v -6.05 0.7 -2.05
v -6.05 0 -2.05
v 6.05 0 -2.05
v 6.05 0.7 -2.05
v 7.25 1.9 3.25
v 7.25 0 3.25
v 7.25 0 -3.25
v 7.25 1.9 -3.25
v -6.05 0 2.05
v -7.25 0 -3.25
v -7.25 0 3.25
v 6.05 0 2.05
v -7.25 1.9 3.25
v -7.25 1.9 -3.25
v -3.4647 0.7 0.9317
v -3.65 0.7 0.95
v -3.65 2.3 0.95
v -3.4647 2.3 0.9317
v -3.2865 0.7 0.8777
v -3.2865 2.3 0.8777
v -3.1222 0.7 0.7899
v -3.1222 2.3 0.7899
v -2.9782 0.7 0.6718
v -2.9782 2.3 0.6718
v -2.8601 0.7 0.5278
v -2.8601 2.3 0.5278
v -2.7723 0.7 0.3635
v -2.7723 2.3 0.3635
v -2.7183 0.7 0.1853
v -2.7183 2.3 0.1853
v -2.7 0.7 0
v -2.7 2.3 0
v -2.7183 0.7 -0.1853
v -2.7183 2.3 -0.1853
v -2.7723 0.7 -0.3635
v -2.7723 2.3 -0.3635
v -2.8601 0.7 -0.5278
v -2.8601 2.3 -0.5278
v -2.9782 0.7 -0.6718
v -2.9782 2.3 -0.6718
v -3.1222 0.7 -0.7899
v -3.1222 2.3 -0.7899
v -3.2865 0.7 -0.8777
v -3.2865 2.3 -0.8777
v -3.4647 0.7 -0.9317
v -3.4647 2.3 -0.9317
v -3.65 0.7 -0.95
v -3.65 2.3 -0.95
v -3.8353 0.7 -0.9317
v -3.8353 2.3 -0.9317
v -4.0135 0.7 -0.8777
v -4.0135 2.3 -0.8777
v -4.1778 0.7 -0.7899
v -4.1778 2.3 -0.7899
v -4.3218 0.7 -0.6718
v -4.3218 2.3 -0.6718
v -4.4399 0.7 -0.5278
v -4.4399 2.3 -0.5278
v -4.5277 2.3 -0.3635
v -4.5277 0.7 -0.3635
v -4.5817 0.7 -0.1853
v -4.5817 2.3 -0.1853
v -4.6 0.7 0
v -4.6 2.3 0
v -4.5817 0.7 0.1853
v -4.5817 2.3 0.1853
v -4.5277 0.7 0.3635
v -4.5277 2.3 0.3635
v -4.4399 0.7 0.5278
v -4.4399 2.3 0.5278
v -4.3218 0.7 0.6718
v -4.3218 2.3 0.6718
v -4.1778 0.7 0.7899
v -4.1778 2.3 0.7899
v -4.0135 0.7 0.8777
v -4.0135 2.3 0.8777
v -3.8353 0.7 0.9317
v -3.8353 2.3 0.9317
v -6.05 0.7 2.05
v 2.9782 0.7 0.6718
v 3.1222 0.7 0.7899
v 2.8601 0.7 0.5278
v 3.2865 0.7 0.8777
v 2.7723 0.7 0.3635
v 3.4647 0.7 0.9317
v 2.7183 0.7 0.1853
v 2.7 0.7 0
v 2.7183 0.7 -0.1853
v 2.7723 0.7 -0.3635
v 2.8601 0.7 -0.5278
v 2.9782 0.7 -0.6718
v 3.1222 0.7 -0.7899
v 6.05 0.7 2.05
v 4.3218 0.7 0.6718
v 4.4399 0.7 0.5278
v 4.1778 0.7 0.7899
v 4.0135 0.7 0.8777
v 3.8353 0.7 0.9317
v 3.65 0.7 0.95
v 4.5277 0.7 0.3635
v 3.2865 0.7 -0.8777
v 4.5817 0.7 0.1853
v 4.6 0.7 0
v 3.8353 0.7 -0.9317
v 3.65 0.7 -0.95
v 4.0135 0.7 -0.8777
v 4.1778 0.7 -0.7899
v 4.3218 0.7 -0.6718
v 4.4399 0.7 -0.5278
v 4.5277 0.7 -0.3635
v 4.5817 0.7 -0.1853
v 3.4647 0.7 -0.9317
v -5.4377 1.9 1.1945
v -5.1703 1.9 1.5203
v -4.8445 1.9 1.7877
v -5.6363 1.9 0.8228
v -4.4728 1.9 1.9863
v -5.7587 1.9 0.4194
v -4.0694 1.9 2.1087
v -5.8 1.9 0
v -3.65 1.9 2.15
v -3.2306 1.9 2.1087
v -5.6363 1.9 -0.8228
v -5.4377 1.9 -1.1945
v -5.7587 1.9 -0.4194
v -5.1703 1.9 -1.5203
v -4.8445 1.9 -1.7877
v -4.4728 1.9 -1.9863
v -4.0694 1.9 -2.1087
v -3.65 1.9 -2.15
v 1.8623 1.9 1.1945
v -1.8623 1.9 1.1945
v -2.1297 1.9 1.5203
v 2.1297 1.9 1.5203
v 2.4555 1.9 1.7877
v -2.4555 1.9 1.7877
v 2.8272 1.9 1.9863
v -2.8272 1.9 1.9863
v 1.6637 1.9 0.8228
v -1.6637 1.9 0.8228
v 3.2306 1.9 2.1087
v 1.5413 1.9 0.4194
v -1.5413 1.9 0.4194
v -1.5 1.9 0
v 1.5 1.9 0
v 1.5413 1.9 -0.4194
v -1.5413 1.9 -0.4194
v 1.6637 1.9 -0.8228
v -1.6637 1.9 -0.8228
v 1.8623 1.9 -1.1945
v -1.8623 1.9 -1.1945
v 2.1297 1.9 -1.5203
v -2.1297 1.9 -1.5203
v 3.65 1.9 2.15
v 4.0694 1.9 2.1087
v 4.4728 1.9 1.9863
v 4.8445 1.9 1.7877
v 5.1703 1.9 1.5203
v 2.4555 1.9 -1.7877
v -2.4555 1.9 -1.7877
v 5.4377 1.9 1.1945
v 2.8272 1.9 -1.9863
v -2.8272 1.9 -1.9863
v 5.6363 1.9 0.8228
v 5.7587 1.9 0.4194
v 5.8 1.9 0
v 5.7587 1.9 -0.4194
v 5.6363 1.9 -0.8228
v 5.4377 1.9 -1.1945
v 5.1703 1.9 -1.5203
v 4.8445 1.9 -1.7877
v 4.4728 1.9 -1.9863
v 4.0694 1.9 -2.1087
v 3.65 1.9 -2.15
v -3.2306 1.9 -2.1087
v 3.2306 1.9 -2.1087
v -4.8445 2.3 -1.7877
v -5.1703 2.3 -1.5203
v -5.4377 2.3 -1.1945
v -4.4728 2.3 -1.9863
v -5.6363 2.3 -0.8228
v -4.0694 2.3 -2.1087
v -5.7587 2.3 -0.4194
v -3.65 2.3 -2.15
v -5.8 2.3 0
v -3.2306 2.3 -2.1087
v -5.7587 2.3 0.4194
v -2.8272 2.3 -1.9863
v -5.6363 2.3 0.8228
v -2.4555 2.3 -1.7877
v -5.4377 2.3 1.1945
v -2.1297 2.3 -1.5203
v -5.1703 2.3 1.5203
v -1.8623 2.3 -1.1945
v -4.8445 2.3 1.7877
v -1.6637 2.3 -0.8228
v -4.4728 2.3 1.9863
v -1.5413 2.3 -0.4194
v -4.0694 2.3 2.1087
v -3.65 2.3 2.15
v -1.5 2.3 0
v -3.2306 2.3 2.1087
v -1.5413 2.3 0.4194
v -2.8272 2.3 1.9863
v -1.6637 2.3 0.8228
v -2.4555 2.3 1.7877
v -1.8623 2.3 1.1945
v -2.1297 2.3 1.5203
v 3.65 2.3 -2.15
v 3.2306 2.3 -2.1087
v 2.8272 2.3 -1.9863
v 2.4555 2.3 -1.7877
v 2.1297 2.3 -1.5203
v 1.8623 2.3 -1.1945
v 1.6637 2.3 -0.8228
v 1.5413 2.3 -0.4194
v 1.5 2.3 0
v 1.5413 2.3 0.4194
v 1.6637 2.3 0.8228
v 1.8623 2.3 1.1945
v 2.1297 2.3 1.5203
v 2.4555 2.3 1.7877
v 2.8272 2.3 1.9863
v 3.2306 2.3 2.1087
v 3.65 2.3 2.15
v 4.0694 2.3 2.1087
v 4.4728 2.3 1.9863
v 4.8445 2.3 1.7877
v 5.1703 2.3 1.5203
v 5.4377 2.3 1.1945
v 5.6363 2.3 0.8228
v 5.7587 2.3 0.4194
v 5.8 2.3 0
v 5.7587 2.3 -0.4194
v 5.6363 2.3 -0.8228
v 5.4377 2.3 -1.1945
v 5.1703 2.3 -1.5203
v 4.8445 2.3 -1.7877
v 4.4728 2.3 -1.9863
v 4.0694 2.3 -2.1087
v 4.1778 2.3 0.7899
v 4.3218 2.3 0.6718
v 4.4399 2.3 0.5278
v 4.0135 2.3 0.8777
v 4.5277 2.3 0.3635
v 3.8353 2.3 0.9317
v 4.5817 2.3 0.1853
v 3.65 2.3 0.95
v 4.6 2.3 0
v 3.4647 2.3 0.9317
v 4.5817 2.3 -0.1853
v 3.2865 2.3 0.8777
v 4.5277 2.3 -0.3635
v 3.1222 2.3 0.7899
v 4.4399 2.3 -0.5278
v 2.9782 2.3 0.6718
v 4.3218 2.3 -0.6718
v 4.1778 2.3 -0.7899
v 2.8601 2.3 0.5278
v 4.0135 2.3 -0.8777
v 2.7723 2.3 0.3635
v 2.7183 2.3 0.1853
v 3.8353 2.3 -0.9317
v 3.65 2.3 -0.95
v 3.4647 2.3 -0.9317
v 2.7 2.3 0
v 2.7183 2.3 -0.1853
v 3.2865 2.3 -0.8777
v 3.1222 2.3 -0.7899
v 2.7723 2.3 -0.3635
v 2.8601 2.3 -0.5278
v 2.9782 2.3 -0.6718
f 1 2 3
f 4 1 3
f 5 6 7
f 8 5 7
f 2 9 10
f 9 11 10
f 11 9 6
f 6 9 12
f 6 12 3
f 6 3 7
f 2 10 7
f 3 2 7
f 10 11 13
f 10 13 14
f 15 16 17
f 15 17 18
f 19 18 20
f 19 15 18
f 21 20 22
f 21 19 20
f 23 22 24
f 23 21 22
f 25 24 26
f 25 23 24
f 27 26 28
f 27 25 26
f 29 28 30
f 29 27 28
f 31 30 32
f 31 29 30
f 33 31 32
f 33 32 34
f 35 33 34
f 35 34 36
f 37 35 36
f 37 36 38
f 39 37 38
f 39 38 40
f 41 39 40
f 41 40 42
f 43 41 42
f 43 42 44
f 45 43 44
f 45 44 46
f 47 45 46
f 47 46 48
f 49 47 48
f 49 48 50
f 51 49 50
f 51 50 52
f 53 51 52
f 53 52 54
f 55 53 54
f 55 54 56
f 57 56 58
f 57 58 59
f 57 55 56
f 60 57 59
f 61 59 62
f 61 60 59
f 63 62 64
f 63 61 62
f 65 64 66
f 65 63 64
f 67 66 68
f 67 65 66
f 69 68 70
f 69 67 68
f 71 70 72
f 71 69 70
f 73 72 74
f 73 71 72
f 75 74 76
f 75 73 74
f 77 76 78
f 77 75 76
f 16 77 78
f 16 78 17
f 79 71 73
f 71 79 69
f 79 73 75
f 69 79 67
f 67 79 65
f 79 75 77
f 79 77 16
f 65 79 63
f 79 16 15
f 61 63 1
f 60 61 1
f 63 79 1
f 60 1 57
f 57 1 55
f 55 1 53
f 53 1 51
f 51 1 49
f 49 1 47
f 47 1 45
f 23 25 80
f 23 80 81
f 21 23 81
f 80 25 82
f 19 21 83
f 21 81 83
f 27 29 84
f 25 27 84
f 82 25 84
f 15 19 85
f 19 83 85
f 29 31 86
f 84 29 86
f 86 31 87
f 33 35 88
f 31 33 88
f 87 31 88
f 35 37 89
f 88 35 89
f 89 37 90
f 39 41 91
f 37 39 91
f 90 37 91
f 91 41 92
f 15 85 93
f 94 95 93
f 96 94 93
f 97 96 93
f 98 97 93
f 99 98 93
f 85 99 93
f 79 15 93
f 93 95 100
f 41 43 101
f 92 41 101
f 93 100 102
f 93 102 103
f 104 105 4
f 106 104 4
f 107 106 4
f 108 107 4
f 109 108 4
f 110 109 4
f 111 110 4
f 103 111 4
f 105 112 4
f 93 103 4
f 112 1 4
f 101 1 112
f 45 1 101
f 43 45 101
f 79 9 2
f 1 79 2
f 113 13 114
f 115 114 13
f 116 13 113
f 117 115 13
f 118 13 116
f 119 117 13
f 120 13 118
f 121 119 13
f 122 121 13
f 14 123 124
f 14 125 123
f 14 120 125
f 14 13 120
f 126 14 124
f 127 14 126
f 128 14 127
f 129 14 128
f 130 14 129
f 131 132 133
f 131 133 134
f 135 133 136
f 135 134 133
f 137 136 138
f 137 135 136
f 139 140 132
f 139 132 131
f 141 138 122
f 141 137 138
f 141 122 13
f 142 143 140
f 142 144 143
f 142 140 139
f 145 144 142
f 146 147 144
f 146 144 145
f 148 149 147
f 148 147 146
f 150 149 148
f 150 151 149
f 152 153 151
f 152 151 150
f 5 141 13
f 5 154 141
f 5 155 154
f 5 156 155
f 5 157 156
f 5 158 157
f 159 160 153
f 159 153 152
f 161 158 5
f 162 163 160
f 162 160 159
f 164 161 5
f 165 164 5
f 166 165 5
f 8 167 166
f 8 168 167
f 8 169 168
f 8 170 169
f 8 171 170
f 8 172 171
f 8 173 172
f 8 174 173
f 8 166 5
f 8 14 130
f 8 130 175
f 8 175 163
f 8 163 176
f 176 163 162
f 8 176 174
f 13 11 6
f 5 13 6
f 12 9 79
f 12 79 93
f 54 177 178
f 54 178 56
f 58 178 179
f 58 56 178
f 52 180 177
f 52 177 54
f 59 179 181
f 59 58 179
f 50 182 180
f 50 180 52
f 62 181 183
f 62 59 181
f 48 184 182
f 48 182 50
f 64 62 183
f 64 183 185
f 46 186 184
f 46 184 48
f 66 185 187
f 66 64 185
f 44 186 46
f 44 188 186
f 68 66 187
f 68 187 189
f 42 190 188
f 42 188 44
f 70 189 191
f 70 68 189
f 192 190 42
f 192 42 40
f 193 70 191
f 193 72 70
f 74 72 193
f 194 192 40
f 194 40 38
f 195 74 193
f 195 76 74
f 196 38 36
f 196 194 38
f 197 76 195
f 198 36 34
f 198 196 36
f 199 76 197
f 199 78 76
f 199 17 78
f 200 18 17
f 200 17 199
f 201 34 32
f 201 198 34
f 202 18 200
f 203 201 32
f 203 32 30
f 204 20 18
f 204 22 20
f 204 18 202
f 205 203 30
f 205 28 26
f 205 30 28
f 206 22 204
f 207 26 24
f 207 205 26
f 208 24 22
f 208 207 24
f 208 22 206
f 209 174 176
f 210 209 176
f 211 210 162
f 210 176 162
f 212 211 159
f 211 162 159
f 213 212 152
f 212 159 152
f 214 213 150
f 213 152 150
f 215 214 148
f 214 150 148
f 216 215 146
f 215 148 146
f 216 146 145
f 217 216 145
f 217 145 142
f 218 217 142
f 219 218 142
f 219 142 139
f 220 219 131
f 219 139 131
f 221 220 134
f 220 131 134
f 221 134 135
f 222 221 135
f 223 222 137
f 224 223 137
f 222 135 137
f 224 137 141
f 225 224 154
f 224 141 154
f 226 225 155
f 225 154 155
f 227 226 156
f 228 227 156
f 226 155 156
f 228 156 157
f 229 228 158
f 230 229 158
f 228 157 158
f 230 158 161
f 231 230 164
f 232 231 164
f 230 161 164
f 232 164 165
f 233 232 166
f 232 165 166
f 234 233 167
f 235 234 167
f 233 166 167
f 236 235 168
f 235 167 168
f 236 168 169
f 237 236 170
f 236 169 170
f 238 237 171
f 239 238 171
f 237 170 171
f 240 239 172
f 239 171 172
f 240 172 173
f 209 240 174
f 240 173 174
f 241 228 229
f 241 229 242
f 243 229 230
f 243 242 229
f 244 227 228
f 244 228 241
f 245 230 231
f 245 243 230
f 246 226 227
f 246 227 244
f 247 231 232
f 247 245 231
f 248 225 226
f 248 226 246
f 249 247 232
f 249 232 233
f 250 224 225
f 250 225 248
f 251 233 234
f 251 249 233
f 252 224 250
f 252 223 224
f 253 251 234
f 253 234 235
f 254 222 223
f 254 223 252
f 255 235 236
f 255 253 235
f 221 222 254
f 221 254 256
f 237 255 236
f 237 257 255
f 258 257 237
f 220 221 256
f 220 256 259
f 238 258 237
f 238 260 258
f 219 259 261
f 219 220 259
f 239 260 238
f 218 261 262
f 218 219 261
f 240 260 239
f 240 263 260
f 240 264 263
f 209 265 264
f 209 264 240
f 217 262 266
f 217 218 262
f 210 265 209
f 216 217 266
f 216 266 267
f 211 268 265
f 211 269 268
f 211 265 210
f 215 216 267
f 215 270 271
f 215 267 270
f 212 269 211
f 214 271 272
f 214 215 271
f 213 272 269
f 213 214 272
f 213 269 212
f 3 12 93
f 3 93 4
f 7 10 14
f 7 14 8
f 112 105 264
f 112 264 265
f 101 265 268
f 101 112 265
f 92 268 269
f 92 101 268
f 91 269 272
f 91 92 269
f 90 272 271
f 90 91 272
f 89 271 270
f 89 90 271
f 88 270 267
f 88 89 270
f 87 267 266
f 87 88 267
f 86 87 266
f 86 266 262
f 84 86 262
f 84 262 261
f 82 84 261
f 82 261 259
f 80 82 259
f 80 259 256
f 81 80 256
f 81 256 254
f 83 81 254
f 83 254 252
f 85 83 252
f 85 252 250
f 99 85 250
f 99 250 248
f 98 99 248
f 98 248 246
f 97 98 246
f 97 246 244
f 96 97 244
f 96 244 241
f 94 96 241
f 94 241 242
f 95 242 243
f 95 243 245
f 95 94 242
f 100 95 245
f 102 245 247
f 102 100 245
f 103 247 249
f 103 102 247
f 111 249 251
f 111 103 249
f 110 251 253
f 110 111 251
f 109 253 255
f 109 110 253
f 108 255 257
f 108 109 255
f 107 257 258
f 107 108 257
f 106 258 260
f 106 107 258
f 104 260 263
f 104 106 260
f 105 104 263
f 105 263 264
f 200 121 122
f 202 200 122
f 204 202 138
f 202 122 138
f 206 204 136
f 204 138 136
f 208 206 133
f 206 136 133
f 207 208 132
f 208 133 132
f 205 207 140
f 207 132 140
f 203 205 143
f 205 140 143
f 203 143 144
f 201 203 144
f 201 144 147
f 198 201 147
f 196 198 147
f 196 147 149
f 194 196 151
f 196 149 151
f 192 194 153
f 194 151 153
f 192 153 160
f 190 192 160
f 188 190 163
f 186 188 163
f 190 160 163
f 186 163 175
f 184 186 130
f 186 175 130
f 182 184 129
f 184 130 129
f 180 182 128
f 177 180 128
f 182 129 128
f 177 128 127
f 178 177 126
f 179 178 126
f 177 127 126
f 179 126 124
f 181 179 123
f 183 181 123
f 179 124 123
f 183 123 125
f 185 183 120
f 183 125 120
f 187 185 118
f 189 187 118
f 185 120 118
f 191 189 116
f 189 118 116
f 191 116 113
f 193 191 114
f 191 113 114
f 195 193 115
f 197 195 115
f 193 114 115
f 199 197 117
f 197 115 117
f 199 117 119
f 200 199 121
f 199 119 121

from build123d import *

# Parameters (mm, degrees)
SKETCH1_W           = 14.5
SKETCH1_H           = 6.5
BOSS_EXTRUDE1_DEPTH = 1.9
SHELL1_T            = -1.2
SKETCH2_R           = 2.15
SKETCH2_R_2         = 0.95
BOSS_EXTRUDE2_DEPTH = 0.4
CUT_EXTRUDE1_START  = -3.4
SKETCH3_R           = 0.95
CUT_EXTRUDE1_DEPTH  = 3.4
CUT_EXTRUDE2_START  = -3.4
SKETCH4_R           = 0.95
CUT_EXTRUDE2_DEPTH  = 3.4


with BuildPart() as part:
    # Sketch1 → Boss-Extrude1 (new body)
    with BuildSketch(Plane(origin=(0, 0, 0), x_dir=(1, 0, 0), z_dir=(0, 1, 0))):
        Rectangle(SKETCH1_W, SKETCH1_H)
    extrude(amount=BOSS_EXTRUDE1_DEPTH)

    # Shell1
    shell1_openings = [part.faces().sort_by_distance(p)[0] for p in [
        (0, 0, 0),
    ]]
    offset(amount=SHELL1_T, openings=shell1_openings, kind=Kind.INTERSECTION)

    # Sketch2 → Boss-Extrude2 (add)
    # profile 1 of 2: a face of its own
    with BuildSketch(Plane(origin=(0, 1.9, 0), x_dir=(1, 0, 0), z_dir=(0, 1, 0))):
        with Locations(Location((-3.65, 0, 0), (0, 0, 270))):
            Circle(SKETCH2_R)
        with Locations(Location((-3.65, 0, 0), (0, 0, 270))):
            Circle(SKETCH2_R_2, mode=Mode.SUBTRACT)
    # profile 2 of 2: a face of its own
    with BuildSketch(Plane(origin=(0, 1.9, 0), x_dir=(1, 0, 0), z_dir=(0, 1, 0))):
        with Locations(Location((3.65, 0, 0), (0, 0, 90))):
            Circle(SKETCH2_R)
        with Locations(Location((3.65, 0, 0), (0, 0, 90))):
            Circle(SKETCH2_R_2, mode=Mode.SUBTRACT)
    extrude(amount=BOSS_EXTRUDE2_DEPTH)

    # Sketch3 → Cut-Extrude1 (cut)
    with BuildSketch(Plane(origin=(0, 1.9, 0), x_dir=(1, 0, 0), z_dir=(0, 1, 0)).offset(CUT_EXTRUDE1_START)):
        with Locations(Location((-3.65, 0, 0), (0, 0, 270))):
            Circle(SKETCH3_R)
    extrude(amount=CUT_EXTRUDE1_DEPTH, mode=Mode.SUBTRACT)

    # Sketch4 → Cut-Extrude2 (cut)
    with BuildSketch(Plane(origin=(0, 1.9, 0), x_dir=(1, 0, 0), z_dir=(0, 1, 0)).offset(CUT_EXTRUDE2_START)):
        with Locations(Location((3.65, 0, 0), (0, 0, 90))):
            Circle(SKETCH4_R)
    extrude(amount=CUT_EXTRUDE2_DEPTH, mode=Mode.SUBTRACT)


solid = part.part
